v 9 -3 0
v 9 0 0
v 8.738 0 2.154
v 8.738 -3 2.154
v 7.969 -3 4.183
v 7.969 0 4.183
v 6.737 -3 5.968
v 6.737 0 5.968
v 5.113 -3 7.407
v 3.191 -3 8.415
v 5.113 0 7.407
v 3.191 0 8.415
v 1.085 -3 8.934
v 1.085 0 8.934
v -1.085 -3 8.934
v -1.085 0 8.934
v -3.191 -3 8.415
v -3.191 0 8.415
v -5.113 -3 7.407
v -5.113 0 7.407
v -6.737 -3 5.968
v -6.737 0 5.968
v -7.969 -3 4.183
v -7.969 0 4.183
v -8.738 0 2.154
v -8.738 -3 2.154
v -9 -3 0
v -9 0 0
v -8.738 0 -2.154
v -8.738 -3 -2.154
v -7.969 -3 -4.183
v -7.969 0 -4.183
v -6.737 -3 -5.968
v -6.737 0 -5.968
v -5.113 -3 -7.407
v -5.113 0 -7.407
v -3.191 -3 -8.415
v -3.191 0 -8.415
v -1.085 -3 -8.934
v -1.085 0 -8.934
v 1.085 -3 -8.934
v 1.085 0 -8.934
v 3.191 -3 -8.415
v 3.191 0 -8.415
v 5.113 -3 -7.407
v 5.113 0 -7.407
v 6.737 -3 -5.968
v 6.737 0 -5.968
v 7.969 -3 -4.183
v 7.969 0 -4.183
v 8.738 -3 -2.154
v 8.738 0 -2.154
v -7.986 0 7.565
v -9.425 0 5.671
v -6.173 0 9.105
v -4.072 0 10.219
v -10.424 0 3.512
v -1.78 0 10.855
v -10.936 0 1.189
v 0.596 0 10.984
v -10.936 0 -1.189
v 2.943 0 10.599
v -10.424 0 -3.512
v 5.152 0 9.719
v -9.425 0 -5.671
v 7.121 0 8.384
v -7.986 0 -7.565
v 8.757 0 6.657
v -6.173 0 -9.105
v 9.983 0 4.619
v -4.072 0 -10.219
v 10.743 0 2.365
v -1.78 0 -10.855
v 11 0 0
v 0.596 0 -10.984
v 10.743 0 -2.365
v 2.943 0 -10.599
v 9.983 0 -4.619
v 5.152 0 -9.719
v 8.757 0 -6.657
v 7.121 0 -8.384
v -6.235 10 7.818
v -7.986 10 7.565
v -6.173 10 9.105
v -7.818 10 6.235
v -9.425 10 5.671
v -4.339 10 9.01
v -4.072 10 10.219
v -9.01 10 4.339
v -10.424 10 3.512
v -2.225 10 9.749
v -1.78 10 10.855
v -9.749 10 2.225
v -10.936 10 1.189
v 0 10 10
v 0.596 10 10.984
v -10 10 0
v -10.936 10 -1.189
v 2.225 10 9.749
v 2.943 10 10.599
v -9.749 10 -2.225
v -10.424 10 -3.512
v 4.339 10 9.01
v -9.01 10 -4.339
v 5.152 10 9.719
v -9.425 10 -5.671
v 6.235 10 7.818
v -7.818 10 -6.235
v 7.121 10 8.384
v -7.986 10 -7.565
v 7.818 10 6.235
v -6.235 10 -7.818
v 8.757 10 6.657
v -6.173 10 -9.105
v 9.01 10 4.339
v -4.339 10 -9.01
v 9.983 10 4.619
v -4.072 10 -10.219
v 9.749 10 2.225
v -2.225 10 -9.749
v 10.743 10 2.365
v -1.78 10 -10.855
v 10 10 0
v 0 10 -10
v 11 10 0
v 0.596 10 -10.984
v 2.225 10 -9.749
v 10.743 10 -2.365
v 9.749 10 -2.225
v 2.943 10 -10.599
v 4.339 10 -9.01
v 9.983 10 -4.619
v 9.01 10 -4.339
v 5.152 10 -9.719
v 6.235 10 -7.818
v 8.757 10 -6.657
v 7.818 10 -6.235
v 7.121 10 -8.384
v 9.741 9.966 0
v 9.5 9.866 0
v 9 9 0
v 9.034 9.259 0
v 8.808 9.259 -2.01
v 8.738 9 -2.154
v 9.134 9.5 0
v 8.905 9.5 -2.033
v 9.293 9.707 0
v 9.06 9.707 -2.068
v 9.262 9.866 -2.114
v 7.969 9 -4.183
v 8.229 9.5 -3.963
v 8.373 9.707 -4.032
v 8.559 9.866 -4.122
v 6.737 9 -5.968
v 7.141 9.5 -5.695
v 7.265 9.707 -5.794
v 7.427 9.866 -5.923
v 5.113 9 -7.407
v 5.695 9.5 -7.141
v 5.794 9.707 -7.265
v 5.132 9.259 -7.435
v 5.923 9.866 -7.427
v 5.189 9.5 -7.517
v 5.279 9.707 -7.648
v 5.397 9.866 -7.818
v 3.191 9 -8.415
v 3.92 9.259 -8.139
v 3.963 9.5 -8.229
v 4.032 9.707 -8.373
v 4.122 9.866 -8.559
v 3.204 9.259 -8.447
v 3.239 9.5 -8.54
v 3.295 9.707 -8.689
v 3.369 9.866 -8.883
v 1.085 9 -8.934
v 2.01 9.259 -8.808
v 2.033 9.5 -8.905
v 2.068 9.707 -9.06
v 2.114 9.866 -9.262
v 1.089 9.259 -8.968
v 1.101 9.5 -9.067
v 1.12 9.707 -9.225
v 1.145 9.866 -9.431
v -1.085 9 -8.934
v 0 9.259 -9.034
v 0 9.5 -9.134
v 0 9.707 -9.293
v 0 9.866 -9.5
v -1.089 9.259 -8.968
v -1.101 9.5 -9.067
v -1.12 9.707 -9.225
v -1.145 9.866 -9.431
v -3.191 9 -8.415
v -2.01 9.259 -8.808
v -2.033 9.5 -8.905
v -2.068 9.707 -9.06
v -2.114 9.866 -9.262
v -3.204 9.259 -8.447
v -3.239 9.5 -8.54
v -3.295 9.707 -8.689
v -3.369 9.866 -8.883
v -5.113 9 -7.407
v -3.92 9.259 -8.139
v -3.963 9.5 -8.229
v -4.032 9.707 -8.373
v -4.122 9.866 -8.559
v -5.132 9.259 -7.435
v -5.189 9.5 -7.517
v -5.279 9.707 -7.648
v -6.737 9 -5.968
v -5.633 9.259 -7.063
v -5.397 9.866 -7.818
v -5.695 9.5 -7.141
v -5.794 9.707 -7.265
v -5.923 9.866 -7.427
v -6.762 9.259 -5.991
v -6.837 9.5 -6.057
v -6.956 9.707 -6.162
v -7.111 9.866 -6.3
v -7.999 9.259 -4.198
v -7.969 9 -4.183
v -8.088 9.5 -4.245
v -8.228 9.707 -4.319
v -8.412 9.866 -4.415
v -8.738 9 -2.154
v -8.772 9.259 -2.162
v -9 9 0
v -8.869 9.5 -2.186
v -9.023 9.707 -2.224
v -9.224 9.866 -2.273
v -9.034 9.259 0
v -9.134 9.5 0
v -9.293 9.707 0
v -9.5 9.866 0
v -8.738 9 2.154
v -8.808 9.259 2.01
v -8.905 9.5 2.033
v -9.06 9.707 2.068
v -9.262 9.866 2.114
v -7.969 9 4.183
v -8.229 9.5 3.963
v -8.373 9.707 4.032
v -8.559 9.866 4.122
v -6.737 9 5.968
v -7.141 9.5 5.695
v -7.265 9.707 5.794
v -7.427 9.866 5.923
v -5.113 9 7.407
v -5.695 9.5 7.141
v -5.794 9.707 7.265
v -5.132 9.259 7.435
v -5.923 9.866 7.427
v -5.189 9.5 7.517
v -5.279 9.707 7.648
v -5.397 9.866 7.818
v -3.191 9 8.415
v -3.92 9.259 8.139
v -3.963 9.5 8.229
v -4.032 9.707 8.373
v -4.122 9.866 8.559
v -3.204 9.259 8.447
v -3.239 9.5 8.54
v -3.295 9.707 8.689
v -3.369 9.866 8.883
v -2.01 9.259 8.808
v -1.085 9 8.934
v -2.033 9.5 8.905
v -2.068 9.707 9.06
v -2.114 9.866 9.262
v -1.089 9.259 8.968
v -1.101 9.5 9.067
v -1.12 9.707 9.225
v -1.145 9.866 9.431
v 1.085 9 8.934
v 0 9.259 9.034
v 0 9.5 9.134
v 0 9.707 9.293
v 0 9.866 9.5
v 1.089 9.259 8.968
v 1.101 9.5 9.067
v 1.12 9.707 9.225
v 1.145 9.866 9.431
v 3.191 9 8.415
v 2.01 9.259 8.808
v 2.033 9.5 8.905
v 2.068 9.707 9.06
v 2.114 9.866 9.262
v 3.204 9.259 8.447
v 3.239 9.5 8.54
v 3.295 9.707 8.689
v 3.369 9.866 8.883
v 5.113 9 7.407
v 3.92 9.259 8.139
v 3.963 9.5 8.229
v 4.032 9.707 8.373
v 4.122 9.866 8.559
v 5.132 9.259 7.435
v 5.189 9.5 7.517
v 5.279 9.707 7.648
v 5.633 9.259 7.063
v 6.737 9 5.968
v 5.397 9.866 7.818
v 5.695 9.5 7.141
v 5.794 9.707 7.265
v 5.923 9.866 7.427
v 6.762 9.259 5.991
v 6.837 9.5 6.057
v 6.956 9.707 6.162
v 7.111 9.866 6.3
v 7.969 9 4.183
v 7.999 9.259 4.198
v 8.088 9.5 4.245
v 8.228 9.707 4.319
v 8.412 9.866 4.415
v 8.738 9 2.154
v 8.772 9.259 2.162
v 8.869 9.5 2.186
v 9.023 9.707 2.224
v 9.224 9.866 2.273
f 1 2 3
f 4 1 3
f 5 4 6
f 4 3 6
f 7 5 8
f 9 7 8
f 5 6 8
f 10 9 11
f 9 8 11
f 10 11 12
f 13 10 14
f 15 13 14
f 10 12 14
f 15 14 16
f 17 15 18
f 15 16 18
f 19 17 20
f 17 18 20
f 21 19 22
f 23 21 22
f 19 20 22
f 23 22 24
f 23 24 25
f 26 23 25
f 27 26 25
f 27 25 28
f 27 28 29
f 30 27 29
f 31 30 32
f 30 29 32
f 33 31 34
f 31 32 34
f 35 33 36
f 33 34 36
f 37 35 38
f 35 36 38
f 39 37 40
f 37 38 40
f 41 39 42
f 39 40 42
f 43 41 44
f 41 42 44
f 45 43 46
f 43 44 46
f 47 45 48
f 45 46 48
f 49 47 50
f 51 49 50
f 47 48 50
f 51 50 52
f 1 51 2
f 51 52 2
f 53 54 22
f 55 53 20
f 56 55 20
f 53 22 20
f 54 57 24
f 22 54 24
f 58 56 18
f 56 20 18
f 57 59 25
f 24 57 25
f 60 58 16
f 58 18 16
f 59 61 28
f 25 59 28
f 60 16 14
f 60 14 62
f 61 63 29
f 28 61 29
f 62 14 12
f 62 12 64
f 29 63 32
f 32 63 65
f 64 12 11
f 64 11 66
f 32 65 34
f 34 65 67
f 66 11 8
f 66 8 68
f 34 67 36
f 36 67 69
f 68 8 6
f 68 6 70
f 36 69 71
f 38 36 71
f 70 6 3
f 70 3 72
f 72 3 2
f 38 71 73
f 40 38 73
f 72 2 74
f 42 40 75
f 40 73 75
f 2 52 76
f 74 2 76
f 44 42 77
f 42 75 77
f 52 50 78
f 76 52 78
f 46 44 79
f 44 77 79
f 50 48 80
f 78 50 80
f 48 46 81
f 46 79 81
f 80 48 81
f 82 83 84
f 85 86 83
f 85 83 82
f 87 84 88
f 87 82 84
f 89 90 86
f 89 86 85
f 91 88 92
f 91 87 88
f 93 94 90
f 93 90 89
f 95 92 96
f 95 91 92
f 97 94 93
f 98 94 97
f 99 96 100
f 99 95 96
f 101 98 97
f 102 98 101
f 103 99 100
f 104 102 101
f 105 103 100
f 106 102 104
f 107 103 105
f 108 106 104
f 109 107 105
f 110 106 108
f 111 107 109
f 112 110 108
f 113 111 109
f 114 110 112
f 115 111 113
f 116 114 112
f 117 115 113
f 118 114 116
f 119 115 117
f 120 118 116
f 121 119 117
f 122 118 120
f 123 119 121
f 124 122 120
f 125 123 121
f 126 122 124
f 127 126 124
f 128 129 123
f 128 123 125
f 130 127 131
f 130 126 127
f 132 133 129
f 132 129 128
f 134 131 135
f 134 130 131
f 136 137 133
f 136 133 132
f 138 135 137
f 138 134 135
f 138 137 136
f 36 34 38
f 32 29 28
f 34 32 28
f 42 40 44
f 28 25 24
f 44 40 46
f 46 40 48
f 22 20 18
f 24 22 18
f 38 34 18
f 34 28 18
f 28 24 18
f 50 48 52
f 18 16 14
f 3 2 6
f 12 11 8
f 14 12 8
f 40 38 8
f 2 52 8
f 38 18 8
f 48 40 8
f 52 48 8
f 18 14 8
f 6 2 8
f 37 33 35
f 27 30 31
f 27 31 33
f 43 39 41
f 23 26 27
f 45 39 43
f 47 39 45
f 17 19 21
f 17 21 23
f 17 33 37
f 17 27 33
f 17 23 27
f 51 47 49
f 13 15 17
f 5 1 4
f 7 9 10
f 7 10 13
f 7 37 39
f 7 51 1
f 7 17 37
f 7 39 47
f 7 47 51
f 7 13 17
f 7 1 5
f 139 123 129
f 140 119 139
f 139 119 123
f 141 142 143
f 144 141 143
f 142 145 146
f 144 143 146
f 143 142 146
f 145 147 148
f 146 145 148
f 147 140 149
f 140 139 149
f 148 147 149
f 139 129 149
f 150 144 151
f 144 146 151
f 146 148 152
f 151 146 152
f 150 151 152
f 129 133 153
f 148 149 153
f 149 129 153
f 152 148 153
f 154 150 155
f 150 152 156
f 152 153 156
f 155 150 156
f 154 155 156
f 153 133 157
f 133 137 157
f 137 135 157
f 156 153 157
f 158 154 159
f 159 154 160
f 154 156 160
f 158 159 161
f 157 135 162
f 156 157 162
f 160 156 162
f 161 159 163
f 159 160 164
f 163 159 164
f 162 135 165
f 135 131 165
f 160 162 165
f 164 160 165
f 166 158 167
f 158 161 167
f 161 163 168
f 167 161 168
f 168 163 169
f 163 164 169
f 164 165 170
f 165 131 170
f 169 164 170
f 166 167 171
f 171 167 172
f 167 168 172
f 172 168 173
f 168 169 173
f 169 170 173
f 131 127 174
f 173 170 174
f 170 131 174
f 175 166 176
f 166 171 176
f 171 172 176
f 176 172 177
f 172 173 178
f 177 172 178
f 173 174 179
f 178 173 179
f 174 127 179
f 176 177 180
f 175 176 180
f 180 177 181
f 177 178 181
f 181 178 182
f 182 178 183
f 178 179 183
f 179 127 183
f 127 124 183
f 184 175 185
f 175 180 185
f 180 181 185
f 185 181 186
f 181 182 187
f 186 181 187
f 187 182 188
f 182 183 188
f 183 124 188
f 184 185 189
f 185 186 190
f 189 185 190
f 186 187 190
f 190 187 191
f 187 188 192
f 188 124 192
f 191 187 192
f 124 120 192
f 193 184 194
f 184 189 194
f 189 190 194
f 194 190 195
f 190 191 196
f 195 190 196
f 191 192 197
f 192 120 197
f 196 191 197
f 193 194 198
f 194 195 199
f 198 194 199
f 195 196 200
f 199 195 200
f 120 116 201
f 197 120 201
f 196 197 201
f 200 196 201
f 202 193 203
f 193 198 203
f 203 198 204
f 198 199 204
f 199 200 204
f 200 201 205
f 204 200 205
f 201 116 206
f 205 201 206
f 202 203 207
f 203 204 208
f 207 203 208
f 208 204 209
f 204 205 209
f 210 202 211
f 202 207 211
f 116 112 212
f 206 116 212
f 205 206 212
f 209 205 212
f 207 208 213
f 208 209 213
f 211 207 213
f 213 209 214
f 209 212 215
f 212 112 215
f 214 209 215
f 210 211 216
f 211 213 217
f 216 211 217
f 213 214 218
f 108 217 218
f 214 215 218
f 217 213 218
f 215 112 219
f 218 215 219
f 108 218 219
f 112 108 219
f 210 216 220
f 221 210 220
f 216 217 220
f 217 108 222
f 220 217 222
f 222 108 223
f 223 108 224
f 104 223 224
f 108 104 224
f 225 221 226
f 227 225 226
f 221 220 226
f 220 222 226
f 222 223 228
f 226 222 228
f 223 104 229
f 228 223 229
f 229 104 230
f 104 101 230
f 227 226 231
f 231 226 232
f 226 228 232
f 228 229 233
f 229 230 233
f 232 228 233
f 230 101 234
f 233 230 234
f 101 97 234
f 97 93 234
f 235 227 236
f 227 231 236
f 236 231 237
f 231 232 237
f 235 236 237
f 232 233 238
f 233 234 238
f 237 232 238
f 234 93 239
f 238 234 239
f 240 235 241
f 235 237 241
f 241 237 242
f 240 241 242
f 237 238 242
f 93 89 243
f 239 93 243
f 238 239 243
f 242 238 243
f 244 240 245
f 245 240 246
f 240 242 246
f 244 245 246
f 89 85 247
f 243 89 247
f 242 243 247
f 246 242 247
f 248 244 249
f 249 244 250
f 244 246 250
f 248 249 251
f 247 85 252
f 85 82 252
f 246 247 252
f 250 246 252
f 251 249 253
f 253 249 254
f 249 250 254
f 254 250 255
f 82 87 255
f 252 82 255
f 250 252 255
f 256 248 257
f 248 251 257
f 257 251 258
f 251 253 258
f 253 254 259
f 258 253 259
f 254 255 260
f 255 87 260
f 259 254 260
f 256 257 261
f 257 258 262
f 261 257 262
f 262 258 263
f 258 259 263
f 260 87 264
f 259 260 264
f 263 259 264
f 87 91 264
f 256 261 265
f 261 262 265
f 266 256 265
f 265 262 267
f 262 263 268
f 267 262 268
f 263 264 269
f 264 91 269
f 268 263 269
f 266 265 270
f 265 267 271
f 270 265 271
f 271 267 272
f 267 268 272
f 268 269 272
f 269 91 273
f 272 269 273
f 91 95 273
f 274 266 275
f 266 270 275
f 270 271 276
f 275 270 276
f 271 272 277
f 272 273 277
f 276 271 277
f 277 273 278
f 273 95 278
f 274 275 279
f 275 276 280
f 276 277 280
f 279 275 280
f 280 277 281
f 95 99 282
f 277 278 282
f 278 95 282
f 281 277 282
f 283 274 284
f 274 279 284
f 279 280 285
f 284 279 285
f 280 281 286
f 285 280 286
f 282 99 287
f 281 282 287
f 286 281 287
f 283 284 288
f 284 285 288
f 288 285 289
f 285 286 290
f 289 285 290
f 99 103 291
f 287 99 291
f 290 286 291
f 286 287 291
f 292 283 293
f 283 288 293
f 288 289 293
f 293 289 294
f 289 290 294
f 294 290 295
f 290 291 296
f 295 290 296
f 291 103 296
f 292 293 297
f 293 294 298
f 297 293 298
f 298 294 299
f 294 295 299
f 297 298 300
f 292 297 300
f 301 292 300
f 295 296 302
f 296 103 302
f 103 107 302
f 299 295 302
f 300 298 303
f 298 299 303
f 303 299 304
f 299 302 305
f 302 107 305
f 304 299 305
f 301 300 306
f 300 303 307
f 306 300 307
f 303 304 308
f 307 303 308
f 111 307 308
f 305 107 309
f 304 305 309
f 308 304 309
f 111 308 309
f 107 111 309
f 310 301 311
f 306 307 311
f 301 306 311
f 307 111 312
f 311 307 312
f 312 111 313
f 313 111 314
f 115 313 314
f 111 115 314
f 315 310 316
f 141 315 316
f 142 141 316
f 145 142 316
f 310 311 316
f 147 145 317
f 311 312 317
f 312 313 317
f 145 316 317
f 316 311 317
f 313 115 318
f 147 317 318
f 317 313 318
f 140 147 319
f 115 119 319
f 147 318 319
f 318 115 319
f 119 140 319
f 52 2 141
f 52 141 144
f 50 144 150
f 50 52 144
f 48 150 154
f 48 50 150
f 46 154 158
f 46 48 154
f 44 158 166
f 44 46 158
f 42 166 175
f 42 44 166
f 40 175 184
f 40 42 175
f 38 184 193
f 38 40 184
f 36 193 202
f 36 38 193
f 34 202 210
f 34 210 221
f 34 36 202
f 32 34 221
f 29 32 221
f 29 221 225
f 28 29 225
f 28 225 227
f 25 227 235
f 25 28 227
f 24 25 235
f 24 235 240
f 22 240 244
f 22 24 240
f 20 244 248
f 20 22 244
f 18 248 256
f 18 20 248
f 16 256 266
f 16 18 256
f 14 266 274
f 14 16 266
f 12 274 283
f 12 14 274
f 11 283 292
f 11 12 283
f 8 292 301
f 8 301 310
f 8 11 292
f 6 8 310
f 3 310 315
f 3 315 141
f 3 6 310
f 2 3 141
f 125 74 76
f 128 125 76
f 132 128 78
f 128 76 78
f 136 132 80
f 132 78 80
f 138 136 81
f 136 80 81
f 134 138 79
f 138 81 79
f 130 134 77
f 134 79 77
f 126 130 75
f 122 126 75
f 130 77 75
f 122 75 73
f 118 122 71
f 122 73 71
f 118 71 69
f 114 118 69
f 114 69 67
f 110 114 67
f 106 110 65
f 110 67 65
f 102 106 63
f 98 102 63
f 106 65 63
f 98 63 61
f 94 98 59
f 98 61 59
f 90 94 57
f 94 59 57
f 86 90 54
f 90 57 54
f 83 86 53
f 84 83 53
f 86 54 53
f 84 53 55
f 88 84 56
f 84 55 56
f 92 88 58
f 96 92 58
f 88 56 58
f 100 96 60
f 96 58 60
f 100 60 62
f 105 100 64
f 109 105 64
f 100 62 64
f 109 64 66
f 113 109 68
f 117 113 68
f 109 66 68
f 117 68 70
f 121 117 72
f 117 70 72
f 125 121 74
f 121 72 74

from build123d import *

# Parameters (mm, degrees)
SKETCH1_R           = 11
SKETCH1_R_2         = 9
BOSS_EXTRUDE1_DEPTH = 10
FILLET1_R           = 1
SKETCH2_R           = 9
BOSS_EXTRUDE2_DEPTH = 3


with BuildPart() as part:
    # Sketch1 → Boss-Extrude1 (new body)
    with BuildSketch(Plane(origin=(0, 0, 0), x_dir=(1, 0, 0), z_dir=(0, 1, 0))):
        Circle(SKETCH1_R)
        Circle(SKETCH1_R_2, mode=Mode.SUBTRACT)
    extrude(amount=BOSS_EXTRUDE1_DEPTH)

    # Fillet1
    fillet1_edges = [part.edges().sort_by_distance(p)[0] for p in [
        (-9, 10, 0),
    ]]
    fillet(fillet1_edges, radius=FILLET1_R)


with BuildPart() as body_2:
    # Sketch2 → Boss-Extrude2 (new body)
    with BuildSketch(Plane.XZ):
        Circle(SKETCH2_R)
    extrude(amount=BOSS_EXTRUDE2_DEPTH)


solid = Compound([part.part, body_2.part])
